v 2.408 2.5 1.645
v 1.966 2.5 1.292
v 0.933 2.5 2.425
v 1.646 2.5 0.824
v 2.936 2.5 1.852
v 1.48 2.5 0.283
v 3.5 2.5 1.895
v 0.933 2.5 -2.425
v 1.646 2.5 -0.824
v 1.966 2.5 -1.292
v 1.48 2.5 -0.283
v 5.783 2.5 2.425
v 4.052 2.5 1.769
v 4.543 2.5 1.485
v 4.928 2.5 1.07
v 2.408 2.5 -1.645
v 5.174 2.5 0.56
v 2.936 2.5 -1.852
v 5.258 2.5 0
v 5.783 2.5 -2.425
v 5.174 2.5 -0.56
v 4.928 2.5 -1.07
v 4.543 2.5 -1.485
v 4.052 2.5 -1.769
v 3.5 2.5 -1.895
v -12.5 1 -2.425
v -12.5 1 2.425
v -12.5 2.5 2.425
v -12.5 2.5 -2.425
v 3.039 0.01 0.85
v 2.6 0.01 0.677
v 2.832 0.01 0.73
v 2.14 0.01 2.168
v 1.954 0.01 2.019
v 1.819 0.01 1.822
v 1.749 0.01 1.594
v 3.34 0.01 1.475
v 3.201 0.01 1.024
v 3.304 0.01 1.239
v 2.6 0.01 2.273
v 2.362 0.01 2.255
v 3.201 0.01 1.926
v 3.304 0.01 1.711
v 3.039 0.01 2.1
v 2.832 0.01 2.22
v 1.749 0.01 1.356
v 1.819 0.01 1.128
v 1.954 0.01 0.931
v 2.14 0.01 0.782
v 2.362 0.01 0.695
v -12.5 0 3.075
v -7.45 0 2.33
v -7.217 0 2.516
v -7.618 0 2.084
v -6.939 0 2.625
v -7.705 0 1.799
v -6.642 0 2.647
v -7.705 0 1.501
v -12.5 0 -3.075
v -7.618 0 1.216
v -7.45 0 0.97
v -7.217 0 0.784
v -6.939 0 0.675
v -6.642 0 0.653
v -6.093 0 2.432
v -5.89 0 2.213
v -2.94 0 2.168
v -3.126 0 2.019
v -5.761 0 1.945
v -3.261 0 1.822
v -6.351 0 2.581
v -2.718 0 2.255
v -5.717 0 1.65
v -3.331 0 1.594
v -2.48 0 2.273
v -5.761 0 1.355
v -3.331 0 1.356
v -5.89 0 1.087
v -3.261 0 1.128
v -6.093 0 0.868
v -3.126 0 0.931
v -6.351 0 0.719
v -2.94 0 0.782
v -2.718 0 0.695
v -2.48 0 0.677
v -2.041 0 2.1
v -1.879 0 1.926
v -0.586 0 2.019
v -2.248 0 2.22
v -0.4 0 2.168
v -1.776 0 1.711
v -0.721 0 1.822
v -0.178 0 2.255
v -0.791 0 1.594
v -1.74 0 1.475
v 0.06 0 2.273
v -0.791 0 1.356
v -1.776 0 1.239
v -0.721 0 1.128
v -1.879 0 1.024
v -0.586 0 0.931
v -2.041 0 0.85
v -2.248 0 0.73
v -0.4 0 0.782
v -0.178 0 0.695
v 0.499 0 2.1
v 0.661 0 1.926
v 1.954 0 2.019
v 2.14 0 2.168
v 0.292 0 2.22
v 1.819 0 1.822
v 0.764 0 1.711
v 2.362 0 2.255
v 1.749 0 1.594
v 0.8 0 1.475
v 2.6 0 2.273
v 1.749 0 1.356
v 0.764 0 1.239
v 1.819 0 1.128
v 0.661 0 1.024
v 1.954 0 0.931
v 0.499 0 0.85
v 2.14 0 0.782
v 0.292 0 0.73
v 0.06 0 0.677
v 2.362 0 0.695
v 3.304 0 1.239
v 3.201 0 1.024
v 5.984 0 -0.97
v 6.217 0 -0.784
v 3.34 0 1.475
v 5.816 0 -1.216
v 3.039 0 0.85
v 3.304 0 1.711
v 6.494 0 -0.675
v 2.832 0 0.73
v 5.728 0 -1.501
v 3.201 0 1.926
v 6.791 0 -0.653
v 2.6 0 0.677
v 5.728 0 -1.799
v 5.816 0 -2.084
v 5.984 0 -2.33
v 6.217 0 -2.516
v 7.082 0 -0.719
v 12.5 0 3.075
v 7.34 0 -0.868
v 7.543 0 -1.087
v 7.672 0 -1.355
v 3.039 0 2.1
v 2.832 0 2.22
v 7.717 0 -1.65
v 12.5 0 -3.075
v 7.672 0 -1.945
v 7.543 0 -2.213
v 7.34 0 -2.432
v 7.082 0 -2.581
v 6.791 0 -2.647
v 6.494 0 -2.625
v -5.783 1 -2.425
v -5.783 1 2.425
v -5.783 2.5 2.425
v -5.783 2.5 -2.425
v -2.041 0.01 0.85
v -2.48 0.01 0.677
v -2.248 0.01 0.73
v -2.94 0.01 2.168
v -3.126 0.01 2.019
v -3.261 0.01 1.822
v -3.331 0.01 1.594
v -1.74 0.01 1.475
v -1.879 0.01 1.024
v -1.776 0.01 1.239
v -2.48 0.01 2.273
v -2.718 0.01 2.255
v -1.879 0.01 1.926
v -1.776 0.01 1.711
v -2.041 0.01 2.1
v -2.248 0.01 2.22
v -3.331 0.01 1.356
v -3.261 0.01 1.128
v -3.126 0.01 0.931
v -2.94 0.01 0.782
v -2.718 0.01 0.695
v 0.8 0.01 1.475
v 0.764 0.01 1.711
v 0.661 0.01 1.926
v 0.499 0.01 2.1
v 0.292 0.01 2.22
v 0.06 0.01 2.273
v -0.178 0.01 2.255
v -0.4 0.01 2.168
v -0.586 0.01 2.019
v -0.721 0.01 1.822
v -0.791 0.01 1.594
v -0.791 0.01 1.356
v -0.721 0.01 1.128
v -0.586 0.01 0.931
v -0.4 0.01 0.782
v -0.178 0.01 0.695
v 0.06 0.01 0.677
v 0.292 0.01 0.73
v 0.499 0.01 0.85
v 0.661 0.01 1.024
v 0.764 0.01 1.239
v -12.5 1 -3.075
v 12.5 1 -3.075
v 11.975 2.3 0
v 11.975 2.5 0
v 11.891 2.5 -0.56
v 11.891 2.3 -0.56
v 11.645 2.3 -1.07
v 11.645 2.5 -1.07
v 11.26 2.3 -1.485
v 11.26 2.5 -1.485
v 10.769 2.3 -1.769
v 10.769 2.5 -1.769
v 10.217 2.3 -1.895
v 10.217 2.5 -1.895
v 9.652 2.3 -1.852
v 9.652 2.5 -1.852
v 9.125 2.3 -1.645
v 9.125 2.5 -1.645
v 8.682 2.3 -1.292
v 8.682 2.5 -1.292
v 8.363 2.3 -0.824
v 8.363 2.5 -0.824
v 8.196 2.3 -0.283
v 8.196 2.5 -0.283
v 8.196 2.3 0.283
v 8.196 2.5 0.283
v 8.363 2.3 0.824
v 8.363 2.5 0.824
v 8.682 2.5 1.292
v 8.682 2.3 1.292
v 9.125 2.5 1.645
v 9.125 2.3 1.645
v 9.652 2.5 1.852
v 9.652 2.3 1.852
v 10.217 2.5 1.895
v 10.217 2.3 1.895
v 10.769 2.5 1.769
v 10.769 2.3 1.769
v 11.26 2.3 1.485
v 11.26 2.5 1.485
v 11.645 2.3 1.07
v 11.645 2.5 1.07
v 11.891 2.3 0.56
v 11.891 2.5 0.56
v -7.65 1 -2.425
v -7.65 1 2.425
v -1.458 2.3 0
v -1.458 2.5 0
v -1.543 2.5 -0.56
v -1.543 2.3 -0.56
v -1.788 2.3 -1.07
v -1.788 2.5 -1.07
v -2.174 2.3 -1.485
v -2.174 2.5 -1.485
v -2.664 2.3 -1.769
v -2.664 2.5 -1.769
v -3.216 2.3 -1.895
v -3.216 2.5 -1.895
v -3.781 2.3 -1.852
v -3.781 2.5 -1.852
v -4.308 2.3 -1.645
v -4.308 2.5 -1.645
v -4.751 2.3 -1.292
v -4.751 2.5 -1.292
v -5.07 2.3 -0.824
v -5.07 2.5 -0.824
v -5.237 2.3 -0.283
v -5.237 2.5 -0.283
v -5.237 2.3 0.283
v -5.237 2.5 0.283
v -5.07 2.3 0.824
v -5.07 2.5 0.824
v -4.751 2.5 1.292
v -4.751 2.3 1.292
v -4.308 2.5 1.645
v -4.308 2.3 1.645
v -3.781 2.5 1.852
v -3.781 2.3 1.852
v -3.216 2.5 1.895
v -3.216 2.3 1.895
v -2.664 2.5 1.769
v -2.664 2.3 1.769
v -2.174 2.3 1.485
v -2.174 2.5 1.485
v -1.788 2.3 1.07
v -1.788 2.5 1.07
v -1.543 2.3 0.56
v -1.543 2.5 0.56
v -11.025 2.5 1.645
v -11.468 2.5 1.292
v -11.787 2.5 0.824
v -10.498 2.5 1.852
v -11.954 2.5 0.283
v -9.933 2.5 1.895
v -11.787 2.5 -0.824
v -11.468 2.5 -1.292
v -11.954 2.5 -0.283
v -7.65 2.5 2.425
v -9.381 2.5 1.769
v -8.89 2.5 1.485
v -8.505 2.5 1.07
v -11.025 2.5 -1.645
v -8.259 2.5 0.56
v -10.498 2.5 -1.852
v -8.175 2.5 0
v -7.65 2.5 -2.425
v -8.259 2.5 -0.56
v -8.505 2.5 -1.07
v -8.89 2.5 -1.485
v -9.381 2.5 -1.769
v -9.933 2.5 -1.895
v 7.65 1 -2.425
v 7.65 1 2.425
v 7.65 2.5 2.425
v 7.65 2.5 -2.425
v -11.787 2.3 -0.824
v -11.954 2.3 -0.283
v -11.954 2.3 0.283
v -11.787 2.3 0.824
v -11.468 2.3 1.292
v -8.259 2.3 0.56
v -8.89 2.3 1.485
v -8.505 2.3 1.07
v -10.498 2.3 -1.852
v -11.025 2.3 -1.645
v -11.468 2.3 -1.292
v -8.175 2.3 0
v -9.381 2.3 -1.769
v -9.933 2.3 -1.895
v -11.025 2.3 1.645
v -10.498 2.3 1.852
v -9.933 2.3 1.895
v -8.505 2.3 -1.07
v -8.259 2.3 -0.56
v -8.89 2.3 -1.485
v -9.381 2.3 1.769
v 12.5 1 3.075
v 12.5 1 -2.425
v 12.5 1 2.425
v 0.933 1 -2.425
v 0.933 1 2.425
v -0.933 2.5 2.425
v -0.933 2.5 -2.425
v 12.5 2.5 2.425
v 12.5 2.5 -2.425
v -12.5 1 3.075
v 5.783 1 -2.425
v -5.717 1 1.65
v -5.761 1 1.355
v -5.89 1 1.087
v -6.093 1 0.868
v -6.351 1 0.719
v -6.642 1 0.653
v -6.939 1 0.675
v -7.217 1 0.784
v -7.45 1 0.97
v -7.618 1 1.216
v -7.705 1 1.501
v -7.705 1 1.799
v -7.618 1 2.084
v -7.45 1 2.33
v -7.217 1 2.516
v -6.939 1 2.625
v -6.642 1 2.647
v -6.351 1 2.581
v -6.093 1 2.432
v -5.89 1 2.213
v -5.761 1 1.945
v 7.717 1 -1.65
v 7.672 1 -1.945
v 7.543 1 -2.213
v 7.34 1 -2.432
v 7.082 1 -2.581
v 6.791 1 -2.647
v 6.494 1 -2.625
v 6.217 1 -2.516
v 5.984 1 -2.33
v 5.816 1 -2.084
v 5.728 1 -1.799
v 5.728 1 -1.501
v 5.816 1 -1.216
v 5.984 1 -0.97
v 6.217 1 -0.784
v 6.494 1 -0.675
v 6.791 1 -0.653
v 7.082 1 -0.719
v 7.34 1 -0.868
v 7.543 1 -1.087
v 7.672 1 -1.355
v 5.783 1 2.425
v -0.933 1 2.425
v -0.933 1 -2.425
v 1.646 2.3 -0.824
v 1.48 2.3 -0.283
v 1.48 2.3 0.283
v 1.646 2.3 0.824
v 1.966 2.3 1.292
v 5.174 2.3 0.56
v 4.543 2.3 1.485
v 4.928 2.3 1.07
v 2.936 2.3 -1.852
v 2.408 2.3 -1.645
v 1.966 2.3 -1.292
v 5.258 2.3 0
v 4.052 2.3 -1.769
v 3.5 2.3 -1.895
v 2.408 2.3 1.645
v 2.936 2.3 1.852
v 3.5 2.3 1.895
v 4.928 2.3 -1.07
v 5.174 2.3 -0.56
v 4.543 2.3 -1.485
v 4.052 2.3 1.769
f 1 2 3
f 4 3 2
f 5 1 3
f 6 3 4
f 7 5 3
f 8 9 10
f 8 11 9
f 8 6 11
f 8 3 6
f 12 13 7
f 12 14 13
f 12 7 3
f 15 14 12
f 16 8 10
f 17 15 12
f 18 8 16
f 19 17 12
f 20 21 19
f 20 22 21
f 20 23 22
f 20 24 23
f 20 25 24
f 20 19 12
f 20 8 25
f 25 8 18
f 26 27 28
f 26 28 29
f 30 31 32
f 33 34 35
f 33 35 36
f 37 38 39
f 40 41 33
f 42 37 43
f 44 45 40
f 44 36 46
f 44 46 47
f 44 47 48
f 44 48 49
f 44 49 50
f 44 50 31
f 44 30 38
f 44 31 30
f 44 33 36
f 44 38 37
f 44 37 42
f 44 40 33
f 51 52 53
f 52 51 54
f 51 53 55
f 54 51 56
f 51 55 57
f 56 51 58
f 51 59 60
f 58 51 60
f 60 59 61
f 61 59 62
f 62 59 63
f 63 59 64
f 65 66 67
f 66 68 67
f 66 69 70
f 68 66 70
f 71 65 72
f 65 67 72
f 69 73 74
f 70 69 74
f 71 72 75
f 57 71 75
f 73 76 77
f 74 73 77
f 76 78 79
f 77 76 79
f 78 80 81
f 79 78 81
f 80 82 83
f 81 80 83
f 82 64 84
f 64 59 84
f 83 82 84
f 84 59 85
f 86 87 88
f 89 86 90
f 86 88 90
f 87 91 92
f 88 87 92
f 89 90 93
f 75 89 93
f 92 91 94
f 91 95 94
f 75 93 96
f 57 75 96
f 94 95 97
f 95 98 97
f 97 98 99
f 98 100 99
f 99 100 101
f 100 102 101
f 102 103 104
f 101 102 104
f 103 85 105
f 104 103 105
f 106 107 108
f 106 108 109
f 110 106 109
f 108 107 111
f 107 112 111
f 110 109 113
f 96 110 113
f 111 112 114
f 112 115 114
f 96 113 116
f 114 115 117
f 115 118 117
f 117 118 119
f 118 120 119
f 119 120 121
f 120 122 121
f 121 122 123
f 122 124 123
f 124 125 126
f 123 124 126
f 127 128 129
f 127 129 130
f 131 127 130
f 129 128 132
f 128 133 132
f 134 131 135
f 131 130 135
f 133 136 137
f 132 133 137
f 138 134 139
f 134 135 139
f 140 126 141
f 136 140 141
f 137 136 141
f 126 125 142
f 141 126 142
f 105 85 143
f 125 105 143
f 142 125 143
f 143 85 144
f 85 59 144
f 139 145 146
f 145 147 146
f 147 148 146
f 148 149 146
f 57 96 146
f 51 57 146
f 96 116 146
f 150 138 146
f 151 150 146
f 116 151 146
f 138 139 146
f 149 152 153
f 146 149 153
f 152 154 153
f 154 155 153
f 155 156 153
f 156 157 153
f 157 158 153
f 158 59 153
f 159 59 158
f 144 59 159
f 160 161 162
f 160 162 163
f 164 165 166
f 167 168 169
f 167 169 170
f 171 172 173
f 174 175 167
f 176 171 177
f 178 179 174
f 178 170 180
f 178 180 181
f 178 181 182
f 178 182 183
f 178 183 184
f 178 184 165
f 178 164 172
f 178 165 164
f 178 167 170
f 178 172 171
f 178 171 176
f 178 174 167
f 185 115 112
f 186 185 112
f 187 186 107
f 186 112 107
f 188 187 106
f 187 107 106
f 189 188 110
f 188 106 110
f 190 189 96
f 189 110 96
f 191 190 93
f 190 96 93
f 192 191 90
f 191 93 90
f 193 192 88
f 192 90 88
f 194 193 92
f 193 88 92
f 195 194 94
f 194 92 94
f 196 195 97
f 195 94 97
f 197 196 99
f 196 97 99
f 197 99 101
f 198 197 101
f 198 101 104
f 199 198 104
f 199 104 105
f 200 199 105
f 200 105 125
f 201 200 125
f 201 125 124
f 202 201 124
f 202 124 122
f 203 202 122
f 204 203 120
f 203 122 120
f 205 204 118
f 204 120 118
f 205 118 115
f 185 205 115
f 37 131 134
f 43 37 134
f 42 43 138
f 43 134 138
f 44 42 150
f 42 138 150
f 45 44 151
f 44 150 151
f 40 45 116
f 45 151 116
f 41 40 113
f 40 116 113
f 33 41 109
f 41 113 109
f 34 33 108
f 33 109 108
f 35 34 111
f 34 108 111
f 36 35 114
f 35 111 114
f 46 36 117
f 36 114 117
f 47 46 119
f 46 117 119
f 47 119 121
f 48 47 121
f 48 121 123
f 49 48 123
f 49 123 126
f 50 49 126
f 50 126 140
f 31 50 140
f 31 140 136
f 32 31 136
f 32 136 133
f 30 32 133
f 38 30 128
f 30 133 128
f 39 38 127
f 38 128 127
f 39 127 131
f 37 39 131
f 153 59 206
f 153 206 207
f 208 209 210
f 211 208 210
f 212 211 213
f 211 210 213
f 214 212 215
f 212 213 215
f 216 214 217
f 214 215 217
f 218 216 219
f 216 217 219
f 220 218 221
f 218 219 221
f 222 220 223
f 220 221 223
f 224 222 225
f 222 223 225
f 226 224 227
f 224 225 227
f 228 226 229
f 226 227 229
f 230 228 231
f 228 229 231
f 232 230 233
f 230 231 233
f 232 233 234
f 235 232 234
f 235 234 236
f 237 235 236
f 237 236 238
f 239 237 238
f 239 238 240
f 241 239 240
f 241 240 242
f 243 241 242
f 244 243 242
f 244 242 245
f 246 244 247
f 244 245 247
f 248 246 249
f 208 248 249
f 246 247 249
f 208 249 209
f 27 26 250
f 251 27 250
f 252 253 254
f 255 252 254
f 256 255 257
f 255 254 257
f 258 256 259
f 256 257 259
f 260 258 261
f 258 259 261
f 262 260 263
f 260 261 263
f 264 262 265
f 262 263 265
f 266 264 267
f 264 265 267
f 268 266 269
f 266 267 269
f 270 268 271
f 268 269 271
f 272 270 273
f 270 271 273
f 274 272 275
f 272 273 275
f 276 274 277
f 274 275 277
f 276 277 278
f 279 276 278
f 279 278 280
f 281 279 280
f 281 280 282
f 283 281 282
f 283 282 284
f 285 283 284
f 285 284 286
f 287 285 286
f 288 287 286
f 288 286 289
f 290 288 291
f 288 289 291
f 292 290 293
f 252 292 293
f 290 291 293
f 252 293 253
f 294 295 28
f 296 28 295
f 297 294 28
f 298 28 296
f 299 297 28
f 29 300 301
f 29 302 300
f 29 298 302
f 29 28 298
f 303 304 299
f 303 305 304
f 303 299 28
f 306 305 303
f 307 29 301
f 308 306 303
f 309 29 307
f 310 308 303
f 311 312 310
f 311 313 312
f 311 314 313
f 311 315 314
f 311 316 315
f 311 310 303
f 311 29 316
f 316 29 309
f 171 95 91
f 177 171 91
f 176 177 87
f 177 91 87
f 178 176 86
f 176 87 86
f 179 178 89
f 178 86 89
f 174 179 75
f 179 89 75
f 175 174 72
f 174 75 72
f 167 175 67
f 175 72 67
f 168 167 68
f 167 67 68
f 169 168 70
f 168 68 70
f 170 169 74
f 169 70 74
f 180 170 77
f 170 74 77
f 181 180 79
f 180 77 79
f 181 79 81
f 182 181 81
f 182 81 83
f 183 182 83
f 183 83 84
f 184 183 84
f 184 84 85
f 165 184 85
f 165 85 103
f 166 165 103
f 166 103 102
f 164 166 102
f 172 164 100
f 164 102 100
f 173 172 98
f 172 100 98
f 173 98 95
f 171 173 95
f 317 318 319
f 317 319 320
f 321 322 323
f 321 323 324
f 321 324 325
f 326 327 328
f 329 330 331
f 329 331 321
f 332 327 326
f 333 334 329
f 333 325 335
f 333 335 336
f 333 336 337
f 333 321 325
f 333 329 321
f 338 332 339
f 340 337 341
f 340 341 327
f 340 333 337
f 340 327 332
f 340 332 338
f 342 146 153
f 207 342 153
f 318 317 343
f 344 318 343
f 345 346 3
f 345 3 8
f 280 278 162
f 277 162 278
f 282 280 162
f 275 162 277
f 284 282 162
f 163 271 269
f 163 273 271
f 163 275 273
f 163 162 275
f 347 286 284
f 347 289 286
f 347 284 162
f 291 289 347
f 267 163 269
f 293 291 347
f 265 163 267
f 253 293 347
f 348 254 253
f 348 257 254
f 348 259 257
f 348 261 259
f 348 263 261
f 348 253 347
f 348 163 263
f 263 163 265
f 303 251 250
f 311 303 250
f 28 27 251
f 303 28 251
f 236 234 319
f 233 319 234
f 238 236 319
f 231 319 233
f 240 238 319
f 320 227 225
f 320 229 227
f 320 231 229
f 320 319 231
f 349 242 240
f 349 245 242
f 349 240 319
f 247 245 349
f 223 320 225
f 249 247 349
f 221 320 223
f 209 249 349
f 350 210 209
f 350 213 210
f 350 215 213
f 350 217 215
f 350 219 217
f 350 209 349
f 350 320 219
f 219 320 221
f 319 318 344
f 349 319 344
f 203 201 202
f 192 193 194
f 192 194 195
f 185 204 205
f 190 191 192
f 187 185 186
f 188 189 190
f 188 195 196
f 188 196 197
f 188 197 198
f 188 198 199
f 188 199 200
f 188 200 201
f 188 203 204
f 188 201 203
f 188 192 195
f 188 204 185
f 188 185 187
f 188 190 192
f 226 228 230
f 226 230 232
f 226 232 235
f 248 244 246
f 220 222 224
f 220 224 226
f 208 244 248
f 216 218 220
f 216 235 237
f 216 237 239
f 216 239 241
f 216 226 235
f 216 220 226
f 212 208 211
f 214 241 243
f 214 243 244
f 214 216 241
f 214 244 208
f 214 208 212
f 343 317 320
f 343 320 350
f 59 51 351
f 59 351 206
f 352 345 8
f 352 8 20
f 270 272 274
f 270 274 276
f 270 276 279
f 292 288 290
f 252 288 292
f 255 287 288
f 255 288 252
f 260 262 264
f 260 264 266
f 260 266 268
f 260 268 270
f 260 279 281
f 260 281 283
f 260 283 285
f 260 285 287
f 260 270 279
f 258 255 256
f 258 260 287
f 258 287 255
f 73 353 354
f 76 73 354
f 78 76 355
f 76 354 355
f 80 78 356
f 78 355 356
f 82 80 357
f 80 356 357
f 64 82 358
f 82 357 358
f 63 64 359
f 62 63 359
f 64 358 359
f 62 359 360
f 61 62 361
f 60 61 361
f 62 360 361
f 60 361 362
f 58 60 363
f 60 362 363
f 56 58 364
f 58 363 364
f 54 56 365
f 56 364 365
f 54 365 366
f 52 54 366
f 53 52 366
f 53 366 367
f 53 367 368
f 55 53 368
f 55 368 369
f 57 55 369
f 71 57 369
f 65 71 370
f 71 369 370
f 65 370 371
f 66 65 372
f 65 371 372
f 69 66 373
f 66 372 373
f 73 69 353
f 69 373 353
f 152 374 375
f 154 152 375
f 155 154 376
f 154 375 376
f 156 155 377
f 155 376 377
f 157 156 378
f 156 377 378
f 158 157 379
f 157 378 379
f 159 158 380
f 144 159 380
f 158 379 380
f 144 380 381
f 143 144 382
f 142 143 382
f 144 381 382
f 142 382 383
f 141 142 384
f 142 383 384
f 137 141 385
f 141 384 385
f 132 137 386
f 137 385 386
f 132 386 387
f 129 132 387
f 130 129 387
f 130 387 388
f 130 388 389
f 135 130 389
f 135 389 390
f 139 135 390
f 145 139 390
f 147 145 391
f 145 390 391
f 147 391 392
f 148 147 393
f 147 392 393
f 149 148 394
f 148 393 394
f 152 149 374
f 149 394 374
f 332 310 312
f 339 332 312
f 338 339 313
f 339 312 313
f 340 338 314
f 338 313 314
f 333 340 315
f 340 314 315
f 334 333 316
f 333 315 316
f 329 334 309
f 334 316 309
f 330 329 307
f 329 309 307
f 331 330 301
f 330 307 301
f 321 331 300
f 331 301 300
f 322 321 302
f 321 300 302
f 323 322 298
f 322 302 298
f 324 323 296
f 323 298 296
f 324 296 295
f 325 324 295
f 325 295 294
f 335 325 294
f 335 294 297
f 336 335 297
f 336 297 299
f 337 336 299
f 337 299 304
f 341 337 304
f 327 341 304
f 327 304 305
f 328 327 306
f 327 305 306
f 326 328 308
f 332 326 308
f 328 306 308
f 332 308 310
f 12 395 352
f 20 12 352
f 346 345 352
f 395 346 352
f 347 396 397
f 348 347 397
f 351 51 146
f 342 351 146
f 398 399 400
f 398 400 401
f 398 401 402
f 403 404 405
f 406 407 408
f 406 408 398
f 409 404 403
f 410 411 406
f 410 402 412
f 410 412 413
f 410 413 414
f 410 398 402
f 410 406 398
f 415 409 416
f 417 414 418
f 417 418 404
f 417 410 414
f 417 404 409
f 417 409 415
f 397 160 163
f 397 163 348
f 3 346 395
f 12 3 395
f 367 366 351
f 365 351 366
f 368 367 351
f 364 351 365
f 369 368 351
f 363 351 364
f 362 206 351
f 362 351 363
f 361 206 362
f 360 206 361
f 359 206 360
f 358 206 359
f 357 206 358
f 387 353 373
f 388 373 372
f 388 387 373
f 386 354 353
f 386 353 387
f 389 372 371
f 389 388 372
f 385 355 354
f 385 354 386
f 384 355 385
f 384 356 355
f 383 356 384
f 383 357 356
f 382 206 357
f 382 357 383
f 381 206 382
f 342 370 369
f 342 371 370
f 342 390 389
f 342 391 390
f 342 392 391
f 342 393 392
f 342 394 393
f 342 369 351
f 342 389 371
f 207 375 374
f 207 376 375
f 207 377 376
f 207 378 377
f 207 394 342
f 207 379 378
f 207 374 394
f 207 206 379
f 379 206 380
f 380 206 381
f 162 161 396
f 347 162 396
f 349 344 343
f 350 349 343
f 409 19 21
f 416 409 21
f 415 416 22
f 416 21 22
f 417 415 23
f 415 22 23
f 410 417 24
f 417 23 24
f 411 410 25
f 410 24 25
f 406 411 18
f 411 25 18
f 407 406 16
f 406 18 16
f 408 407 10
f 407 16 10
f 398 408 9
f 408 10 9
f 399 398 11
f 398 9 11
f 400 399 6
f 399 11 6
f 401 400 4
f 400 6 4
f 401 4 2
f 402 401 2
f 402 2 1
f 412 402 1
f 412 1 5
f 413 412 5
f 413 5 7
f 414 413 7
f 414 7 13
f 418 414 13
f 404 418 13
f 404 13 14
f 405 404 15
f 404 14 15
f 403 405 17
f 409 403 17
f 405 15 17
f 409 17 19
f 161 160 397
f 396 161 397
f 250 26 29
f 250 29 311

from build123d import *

# Parameters (mm, degrees)
SKETCH1_W             = 25
SKETCH1_H             = 6.15
BOSS_EXTRUDE1_DEPTH   = 1
SKETCH2_W             = 4.85
SKETCH2_H             = 4.85
BOSS_EXTRUDE2_DEPTH   = 1.5
BOSS_EXTRUDE2_2_DEPTH = 1.5
BOSS_EXTRUDE2_3_DEPTH = 1.5
BOSS_EXTRUDE2_4_DEPTH = 1.5
SKETCH3_R             = 1
CUT_EXTRUDE1_DEPTH    = 1
SKETCH4_R             = 1.9
CUT_EXTRUDE2_DEPTH    = 0.2
SKETCH5_R             = 0.8
CUT_EXTRUDE3_DEPTH    = 0.01


with BuildPart() as part:
    # Sketch1 → Boss-Extrude1 (new body)
    with BuildSketch(Plane(origin=(0, 0, 0), x_dir=(1, 0, 0), z_dir=(0, 1, 0))):
        Rectangle(SKETCH1_W, SKETCH1_H)
    extrude(amount=BOSS_EXTRUDE1_DEPTH)

    # Sketch3 → Cut-Extrude1 (cut)
    with BuildSketch(Plane(origin=(0, 1, 0), x_dir=(1, 0, 0), z_dir=(0, 1, 0))):
        with Locations((-6.716666667, -1.65)):
            Circle(SKETCH3_R)
        with Locations((6.716666667, 1.65)):
            Circle(SKETCH3_R)
    extrude(amount=-CUT_EXTRUDE1_DEPTH, mode=Mode.SUBTRACT)

    # Sketch5 → Cut-Extrude3 (cut)
    with BuildSketch(Plane.XZ):
        with Locations((0, 1.475)):
            Circle(SKETCH5_R)
        with Locations((2.54, 1.475)):
            Circle(SKETCH5_R)
        with Locations((-2.54, 1.475)):
            Circle(SKETCH5_R)
    extrude(amount=-CUT_EXTRUDE3_DEPTH, mode=Mode.SUBTRACT)


with BuildPart() as body_2:
    # Sketch2 → Boss-Extrude2 (new body)
    with BuildSketch(Plane(origin=(0, 1, 0), x_dir=(1, 0, 0), z_dir=(0, 1, 0))):
        with Locations((-3.358333333, 0)):
            Rectangle(SKETCH2_W, SKETCH2_H)
    extrude(amount=BOSS_EXTRUDE2_DEPTH)


with BuildPart() as body_3:
    # Sketch2 → Boss-Extrude2 2 (new body)
    with BuildSketch(Plane(origin=(0, 1, 0), x_dir=(1, 0, 0), z_dir=(0, 1, 0))):
        with Locations((-10.075, 0)):
            Rectangle(SKETCH2_W, SKETCH2_H)
    extrude(amount=BOSS_EXTRUDE2_2_DEPTH)


with BuildPart() as body_4:
    # Sketch2 → Boss-Extrude2 3 (new body)
    with BuildSketch(Plane(origin=(0, 1, 0), x_dir=(1, 0, 0), z_dir=(0, 1, 0))):
        with Locations((3.358333333, 0)):
            Rectangle(SKETCH2_W, SKETCH2_H)
    extrude(amount=BOSS_EXTRUDE2_3_DEPTH)


with BuildPart() as body_5:
    # Sketch2 → Boss-Extrude2 4 (new body)
    with BuildSketch(Plane(origin=(0, 1, 0), x_dir=(1, 0, 0), z_dir=(0, 1, 0))):
        with Locations((10.075, 0)):
            Rectangle(SKETCH2_W, SKETCH2_H)
    extrude(amount=BOSS_EXTRUDE2_4_DEPTH)


with BuildPart() as cut_extrude2_tool:
    # Sketch4 → Cut-Extrude2 (new body)
    with BuildSketch(Plane(origin=(0, 2.5, 0), x_dir=(1, 0, 0), z_dir=(0, 1, 0))):
        with Locations((-10.075, 0)):
            Circle(SKETCH4_R)
        with Locations((-3.358333333, 0)):
            Circle(SKETCH4_R)
        with Locations((3.358333333, 0)):
            Circle(SKETCH4_R)
        with Locations((10.075, 0)):
            Circle(SKETCH4_R)
    extrude(amount=-CUT_EXTRUDE2_DEPTH)


with BuildPart() as body_2_1:
    add(body_2.part)

    # Cut-Extrude2: cut by cut_extrude2_tool
    add(cut_extrude2_tool.part, mode=Mode.SUBTRACT)


with BuildPart() as body_3_1:
    add(body_3.part)

    # Cut-Extrude2: cut by cut_extrude2_tool
    add(cut_extrude2_tool.part, mode=Mode.SUBTRACT)


with BuildPart() as body_4_1:
    add(body_4.part)

    # Cut-Extrude2: cut by cut_extrude2_tool
    add(cut_extrude2_tool.part, mode=Mode.SUBTRACT)


with BuildPart() as body_5_1:
    add(body_5.part)

    # Cut-Extrude2: cut by cut_extrude2_tool
    add(cut_extrude2_tool.part, mode=Mode.SUBTRACT)


solid = Compound([part.part, body_2_1.part, body_3_1.part, body_4_1.part, body_5_1.part])
